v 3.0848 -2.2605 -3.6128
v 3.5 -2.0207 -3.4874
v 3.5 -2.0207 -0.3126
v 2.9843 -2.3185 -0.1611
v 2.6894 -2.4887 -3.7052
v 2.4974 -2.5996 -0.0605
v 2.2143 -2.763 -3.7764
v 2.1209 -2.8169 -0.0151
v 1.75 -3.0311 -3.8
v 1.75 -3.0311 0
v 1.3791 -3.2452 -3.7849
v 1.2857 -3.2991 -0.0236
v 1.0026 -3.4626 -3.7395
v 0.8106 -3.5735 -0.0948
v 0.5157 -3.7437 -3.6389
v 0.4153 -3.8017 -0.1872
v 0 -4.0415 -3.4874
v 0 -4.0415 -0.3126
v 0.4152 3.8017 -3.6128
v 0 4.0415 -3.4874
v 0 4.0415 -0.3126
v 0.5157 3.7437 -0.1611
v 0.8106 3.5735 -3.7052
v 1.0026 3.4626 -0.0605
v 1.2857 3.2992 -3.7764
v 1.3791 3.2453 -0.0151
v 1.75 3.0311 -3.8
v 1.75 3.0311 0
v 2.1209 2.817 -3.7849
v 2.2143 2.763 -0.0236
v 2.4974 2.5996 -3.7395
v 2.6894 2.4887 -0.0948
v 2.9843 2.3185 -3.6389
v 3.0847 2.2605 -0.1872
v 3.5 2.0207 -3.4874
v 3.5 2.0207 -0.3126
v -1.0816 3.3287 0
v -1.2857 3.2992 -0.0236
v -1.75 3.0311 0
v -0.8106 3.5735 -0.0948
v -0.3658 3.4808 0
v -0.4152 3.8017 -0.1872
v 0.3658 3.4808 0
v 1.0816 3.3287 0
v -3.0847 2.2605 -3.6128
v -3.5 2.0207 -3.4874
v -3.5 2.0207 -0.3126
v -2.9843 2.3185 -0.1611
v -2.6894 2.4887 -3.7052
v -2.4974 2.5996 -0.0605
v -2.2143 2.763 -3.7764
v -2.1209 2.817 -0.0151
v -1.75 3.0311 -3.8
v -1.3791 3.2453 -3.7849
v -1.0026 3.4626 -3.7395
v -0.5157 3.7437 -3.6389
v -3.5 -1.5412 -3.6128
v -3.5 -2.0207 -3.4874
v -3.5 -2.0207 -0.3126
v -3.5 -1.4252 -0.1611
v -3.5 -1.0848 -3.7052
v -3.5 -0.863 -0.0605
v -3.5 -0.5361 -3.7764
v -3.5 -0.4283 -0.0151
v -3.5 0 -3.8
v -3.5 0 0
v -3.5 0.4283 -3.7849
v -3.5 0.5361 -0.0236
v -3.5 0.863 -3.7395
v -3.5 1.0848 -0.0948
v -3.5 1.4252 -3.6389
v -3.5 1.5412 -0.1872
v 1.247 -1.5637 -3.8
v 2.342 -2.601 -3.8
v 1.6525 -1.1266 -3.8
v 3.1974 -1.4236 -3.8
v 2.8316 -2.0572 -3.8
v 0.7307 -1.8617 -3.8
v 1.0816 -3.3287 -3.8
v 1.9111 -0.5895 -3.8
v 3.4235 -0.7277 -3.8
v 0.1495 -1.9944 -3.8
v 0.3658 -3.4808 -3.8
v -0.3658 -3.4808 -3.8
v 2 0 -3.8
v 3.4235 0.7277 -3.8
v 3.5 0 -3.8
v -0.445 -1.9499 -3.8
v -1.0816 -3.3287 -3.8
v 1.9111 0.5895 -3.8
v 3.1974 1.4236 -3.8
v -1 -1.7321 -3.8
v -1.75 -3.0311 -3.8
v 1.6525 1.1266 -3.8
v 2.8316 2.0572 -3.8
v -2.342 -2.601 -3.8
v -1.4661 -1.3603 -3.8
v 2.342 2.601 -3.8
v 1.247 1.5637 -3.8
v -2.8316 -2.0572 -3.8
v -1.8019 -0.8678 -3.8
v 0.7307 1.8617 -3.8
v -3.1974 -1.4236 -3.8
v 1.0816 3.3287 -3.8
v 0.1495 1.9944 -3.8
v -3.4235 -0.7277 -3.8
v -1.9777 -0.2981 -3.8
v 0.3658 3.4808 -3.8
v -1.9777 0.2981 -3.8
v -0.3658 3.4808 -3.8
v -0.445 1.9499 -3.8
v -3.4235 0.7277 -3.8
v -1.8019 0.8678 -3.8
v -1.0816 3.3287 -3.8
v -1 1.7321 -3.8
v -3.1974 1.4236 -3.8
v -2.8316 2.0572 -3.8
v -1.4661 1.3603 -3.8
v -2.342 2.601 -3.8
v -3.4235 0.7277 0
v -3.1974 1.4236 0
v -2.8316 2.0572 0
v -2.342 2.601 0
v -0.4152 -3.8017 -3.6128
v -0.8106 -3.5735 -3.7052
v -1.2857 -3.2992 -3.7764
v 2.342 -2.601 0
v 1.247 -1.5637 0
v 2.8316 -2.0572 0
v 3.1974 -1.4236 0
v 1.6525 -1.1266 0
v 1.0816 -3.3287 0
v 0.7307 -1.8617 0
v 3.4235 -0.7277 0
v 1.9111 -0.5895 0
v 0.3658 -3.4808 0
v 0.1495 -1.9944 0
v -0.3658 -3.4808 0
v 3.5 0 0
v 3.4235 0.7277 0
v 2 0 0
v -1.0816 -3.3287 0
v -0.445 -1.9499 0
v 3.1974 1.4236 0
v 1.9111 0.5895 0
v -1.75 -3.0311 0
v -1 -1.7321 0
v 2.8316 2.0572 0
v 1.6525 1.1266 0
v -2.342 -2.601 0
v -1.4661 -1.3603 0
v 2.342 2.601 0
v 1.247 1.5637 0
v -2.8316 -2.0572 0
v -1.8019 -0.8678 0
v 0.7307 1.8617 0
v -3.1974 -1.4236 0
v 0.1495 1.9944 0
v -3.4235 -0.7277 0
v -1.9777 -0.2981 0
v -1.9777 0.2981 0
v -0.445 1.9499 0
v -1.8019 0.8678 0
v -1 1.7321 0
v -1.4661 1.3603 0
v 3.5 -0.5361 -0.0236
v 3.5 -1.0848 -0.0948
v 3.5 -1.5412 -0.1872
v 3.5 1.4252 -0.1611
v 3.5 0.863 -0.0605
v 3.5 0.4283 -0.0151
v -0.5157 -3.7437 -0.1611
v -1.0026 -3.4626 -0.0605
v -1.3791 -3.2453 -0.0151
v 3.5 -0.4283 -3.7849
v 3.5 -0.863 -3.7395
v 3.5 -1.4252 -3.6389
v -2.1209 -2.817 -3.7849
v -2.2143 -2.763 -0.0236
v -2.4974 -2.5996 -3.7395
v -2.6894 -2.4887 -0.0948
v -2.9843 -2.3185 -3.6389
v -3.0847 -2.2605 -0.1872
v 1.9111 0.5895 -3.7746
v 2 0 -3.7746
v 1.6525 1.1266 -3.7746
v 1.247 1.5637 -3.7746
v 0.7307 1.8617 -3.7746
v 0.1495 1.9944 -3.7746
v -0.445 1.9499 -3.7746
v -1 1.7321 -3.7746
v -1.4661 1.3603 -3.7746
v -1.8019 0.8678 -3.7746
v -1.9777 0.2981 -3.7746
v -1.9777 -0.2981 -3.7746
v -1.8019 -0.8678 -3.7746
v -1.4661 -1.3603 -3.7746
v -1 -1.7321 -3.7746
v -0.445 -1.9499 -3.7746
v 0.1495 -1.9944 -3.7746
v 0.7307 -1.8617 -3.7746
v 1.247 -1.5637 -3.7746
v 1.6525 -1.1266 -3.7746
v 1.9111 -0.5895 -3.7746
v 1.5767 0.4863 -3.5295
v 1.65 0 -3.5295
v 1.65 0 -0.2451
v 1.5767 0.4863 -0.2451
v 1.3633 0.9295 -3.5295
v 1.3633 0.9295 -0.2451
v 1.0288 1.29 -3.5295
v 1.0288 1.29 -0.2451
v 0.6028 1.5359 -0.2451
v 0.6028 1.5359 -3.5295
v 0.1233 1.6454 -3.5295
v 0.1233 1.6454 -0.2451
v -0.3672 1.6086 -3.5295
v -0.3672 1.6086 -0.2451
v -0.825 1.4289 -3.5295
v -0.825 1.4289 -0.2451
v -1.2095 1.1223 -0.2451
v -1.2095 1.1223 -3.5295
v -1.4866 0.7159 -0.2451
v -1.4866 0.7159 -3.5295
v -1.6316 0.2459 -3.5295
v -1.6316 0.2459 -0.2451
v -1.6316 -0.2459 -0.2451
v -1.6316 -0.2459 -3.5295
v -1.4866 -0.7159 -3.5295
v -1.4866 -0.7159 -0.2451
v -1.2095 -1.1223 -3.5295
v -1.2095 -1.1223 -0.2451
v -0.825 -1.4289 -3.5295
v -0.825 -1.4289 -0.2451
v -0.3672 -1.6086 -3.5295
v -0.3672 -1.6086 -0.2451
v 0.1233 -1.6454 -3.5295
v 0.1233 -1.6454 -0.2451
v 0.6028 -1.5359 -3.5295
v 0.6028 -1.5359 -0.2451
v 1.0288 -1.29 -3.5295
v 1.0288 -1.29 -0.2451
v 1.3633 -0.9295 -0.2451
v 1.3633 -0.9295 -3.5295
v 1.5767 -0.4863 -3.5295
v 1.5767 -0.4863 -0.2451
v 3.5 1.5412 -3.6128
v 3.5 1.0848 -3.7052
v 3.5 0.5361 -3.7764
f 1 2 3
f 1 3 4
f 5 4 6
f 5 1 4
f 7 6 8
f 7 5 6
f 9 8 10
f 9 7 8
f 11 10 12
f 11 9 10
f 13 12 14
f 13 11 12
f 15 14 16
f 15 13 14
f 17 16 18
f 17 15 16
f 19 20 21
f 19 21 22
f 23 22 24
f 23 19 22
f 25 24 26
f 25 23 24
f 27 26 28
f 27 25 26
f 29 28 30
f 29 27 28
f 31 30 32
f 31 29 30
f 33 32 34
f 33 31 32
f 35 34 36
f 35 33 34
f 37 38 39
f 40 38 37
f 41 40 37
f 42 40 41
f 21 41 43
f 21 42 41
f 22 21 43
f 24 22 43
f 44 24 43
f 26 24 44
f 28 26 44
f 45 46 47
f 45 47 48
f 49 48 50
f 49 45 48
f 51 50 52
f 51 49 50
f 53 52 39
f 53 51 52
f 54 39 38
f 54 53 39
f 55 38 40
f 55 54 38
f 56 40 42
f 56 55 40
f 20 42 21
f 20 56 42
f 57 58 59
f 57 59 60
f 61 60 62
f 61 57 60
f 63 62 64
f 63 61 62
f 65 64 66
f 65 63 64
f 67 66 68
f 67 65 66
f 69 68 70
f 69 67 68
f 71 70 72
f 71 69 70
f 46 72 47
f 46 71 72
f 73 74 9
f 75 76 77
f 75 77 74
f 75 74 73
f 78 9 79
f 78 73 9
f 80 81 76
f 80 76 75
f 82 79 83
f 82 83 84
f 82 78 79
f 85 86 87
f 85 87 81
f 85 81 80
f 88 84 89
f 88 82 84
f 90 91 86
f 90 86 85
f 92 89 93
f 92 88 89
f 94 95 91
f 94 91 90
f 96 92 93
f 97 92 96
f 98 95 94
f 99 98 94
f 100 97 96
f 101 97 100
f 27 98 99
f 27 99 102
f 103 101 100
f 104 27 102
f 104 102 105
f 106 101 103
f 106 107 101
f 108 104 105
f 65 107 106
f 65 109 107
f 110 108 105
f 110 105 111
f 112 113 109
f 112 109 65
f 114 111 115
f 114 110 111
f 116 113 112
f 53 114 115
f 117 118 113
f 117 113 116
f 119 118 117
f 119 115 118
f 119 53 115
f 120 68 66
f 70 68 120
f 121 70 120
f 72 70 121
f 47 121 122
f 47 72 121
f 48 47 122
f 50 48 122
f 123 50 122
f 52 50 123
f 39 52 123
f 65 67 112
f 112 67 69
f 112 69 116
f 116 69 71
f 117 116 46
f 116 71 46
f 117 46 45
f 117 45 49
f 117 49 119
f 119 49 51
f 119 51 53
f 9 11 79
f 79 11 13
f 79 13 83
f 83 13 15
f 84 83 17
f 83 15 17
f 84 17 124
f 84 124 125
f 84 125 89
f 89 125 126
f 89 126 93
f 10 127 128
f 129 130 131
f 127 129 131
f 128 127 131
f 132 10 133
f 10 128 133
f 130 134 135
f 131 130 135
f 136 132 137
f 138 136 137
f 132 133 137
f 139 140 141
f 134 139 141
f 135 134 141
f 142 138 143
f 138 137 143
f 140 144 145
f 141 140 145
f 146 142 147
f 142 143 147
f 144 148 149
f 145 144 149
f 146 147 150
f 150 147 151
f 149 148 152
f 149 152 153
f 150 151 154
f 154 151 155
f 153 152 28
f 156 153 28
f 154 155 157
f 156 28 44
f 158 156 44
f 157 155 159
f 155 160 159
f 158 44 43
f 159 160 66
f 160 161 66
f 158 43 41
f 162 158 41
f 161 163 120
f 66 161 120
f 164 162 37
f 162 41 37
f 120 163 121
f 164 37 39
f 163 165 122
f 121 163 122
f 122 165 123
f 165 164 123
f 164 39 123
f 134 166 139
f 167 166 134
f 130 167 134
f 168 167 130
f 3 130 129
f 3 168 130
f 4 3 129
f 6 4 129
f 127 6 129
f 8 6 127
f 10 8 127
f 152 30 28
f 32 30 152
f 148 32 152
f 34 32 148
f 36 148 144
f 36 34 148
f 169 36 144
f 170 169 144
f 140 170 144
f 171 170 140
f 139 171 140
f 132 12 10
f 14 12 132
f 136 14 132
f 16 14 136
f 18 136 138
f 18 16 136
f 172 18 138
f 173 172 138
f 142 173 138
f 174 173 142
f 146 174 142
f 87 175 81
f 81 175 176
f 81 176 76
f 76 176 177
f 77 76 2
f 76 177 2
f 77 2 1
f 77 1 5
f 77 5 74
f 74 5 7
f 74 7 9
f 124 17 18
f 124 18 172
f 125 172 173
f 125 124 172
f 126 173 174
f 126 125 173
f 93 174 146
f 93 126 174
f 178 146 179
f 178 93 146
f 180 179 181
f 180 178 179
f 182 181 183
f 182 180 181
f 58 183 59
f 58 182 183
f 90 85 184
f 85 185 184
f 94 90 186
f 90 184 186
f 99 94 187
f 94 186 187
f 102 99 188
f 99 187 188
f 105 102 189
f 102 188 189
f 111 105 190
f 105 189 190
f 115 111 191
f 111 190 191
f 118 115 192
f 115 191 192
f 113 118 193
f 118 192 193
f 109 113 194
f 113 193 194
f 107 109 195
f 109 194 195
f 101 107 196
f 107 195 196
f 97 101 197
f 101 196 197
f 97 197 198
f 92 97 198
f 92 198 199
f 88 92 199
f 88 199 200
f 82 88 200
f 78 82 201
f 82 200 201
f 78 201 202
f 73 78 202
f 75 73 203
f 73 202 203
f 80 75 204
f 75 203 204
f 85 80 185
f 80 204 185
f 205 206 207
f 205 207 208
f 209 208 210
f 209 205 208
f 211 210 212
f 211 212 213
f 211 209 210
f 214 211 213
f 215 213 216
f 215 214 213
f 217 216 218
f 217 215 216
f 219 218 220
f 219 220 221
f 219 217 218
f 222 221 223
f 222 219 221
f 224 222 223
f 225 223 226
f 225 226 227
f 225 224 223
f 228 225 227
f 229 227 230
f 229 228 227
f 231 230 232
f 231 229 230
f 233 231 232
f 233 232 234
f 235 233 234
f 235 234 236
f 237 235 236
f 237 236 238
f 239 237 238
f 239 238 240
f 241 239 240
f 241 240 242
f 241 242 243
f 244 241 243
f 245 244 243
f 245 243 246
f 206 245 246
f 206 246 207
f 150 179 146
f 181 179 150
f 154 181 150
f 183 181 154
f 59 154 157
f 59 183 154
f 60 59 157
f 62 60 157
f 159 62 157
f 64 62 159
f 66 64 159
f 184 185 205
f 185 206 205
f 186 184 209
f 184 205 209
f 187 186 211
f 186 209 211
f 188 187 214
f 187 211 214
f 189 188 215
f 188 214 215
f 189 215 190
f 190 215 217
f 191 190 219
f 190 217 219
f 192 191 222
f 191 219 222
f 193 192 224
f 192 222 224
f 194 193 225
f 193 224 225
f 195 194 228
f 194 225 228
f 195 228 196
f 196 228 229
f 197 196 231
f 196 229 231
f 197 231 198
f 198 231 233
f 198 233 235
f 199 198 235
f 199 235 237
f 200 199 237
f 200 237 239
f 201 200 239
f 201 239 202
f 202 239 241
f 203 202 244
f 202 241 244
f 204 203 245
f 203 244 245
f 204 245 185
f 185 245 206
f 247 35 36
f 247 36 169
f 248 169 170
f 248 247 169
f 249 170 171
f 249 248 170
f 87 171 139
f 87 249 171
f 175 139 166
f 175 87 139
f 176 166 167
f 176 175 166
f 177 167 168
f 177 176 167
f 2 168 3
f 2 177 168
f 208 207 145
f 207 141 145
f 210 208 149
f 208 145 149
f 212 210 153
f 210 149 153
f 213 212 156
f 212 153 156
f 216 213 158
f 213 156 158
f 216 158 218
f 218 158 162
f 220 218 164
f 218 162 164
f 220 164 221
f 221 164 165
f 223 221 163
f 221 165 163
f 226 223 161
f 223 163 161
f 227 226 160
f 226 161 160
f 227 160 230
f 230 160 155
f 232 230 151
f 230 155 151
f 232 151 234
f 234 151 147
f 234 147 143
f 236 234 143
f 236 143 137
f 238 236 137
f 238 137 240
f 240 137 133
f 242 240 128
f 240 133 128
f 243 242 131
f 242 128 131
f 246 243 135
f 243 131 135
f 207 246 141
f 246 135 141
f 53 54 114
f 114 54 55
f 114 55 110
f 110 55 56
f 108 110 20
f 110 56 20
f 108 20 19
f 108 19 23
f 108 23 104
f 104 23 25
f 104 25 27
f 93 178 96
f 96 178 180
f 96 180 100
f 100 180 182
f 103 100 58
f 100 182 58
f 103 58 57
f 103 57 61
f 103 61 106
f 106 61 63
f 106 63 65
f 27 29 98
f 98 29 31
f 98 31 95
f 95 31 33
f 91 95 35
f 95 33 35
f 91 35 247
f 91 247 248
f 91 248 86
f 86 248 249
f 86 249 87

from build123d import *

# Parameters (mm, degrees)
BASENUT_START = -3.8
BASENUTSKE_R  = 1.65
BASENUT_DEPTH = 3.8


# Read off the part's stored shape, not the designer's step: ThreadSchematic
with BuildPart() as part:
    # BaseNutSke → BaseNut (new body)
    with BuildSketch(Plane.XY.offset(BASENUT_START)):
        Polygon((3.5, 2.020725942), (3.5, -2.020725942), (0, -4.041451884), (-3.5, -2.020725942), (-3.5, 2.020725942), (0, 4.041451884), align=None)
        Circle(BASENUTSKE_R, mode=Mode.SUBTRACT)
    extrude(amount=BASENUT_DEPTH)

    # Sketch5 (on Front Plane) → EndChamfer (revolve, cut)
    with BuildSketch(Plane.XY):
        Polygon((3.7746, 2), (3.505020098, 1.615), (3.8254, 1.615), (3.8254, 2), align=None)
    revolve(axis=Axis((3.7746, 2, 0), (-0.5735764363510478, -0.8191520442889905, 0)), mode=Mode.SUBTRACT)

    # Sketch3 → Double-Chamfer (revolve, cut)
    with BuildSketch(Plane(origin=(0, 0, 0), x_dir=(0, 0, -1), z_dir=(1, 0, 0))):
        Polygon((3.8, 3.5), (3.487392609, 4.041451884), (3.487392609, 14.041451884), (13.8, 14.041451884), (13.8, 3.5), align=None)
        Polygon((0.312607391, 14.041451884), (-10, 14.041451884), (-10, 3.5), (0, 3.5), (0.312607391, 4.041451884), align=None)
    revolve(axis=Axis((0, 0, 0), (0, 0, -1)), mode=Mode.SUBTRACT)

    # ThreadSchematic outline → ThreadSchematic (revolve, cut)
    with BuildSketch(Plane.XZ):
        Polygon((1.65, 0), (1.65, -0.245072638), (2, 0), align=None)
        Polygon((2, -3.7746), (1.65, -3.529527362), (1.65, -3.8), (2, -3.8), align=None)
    revolve(axis=Axis((0, 0, 0), (0, 0, 1)), mode=Mode.SUBTRACT)


solid = part.part
